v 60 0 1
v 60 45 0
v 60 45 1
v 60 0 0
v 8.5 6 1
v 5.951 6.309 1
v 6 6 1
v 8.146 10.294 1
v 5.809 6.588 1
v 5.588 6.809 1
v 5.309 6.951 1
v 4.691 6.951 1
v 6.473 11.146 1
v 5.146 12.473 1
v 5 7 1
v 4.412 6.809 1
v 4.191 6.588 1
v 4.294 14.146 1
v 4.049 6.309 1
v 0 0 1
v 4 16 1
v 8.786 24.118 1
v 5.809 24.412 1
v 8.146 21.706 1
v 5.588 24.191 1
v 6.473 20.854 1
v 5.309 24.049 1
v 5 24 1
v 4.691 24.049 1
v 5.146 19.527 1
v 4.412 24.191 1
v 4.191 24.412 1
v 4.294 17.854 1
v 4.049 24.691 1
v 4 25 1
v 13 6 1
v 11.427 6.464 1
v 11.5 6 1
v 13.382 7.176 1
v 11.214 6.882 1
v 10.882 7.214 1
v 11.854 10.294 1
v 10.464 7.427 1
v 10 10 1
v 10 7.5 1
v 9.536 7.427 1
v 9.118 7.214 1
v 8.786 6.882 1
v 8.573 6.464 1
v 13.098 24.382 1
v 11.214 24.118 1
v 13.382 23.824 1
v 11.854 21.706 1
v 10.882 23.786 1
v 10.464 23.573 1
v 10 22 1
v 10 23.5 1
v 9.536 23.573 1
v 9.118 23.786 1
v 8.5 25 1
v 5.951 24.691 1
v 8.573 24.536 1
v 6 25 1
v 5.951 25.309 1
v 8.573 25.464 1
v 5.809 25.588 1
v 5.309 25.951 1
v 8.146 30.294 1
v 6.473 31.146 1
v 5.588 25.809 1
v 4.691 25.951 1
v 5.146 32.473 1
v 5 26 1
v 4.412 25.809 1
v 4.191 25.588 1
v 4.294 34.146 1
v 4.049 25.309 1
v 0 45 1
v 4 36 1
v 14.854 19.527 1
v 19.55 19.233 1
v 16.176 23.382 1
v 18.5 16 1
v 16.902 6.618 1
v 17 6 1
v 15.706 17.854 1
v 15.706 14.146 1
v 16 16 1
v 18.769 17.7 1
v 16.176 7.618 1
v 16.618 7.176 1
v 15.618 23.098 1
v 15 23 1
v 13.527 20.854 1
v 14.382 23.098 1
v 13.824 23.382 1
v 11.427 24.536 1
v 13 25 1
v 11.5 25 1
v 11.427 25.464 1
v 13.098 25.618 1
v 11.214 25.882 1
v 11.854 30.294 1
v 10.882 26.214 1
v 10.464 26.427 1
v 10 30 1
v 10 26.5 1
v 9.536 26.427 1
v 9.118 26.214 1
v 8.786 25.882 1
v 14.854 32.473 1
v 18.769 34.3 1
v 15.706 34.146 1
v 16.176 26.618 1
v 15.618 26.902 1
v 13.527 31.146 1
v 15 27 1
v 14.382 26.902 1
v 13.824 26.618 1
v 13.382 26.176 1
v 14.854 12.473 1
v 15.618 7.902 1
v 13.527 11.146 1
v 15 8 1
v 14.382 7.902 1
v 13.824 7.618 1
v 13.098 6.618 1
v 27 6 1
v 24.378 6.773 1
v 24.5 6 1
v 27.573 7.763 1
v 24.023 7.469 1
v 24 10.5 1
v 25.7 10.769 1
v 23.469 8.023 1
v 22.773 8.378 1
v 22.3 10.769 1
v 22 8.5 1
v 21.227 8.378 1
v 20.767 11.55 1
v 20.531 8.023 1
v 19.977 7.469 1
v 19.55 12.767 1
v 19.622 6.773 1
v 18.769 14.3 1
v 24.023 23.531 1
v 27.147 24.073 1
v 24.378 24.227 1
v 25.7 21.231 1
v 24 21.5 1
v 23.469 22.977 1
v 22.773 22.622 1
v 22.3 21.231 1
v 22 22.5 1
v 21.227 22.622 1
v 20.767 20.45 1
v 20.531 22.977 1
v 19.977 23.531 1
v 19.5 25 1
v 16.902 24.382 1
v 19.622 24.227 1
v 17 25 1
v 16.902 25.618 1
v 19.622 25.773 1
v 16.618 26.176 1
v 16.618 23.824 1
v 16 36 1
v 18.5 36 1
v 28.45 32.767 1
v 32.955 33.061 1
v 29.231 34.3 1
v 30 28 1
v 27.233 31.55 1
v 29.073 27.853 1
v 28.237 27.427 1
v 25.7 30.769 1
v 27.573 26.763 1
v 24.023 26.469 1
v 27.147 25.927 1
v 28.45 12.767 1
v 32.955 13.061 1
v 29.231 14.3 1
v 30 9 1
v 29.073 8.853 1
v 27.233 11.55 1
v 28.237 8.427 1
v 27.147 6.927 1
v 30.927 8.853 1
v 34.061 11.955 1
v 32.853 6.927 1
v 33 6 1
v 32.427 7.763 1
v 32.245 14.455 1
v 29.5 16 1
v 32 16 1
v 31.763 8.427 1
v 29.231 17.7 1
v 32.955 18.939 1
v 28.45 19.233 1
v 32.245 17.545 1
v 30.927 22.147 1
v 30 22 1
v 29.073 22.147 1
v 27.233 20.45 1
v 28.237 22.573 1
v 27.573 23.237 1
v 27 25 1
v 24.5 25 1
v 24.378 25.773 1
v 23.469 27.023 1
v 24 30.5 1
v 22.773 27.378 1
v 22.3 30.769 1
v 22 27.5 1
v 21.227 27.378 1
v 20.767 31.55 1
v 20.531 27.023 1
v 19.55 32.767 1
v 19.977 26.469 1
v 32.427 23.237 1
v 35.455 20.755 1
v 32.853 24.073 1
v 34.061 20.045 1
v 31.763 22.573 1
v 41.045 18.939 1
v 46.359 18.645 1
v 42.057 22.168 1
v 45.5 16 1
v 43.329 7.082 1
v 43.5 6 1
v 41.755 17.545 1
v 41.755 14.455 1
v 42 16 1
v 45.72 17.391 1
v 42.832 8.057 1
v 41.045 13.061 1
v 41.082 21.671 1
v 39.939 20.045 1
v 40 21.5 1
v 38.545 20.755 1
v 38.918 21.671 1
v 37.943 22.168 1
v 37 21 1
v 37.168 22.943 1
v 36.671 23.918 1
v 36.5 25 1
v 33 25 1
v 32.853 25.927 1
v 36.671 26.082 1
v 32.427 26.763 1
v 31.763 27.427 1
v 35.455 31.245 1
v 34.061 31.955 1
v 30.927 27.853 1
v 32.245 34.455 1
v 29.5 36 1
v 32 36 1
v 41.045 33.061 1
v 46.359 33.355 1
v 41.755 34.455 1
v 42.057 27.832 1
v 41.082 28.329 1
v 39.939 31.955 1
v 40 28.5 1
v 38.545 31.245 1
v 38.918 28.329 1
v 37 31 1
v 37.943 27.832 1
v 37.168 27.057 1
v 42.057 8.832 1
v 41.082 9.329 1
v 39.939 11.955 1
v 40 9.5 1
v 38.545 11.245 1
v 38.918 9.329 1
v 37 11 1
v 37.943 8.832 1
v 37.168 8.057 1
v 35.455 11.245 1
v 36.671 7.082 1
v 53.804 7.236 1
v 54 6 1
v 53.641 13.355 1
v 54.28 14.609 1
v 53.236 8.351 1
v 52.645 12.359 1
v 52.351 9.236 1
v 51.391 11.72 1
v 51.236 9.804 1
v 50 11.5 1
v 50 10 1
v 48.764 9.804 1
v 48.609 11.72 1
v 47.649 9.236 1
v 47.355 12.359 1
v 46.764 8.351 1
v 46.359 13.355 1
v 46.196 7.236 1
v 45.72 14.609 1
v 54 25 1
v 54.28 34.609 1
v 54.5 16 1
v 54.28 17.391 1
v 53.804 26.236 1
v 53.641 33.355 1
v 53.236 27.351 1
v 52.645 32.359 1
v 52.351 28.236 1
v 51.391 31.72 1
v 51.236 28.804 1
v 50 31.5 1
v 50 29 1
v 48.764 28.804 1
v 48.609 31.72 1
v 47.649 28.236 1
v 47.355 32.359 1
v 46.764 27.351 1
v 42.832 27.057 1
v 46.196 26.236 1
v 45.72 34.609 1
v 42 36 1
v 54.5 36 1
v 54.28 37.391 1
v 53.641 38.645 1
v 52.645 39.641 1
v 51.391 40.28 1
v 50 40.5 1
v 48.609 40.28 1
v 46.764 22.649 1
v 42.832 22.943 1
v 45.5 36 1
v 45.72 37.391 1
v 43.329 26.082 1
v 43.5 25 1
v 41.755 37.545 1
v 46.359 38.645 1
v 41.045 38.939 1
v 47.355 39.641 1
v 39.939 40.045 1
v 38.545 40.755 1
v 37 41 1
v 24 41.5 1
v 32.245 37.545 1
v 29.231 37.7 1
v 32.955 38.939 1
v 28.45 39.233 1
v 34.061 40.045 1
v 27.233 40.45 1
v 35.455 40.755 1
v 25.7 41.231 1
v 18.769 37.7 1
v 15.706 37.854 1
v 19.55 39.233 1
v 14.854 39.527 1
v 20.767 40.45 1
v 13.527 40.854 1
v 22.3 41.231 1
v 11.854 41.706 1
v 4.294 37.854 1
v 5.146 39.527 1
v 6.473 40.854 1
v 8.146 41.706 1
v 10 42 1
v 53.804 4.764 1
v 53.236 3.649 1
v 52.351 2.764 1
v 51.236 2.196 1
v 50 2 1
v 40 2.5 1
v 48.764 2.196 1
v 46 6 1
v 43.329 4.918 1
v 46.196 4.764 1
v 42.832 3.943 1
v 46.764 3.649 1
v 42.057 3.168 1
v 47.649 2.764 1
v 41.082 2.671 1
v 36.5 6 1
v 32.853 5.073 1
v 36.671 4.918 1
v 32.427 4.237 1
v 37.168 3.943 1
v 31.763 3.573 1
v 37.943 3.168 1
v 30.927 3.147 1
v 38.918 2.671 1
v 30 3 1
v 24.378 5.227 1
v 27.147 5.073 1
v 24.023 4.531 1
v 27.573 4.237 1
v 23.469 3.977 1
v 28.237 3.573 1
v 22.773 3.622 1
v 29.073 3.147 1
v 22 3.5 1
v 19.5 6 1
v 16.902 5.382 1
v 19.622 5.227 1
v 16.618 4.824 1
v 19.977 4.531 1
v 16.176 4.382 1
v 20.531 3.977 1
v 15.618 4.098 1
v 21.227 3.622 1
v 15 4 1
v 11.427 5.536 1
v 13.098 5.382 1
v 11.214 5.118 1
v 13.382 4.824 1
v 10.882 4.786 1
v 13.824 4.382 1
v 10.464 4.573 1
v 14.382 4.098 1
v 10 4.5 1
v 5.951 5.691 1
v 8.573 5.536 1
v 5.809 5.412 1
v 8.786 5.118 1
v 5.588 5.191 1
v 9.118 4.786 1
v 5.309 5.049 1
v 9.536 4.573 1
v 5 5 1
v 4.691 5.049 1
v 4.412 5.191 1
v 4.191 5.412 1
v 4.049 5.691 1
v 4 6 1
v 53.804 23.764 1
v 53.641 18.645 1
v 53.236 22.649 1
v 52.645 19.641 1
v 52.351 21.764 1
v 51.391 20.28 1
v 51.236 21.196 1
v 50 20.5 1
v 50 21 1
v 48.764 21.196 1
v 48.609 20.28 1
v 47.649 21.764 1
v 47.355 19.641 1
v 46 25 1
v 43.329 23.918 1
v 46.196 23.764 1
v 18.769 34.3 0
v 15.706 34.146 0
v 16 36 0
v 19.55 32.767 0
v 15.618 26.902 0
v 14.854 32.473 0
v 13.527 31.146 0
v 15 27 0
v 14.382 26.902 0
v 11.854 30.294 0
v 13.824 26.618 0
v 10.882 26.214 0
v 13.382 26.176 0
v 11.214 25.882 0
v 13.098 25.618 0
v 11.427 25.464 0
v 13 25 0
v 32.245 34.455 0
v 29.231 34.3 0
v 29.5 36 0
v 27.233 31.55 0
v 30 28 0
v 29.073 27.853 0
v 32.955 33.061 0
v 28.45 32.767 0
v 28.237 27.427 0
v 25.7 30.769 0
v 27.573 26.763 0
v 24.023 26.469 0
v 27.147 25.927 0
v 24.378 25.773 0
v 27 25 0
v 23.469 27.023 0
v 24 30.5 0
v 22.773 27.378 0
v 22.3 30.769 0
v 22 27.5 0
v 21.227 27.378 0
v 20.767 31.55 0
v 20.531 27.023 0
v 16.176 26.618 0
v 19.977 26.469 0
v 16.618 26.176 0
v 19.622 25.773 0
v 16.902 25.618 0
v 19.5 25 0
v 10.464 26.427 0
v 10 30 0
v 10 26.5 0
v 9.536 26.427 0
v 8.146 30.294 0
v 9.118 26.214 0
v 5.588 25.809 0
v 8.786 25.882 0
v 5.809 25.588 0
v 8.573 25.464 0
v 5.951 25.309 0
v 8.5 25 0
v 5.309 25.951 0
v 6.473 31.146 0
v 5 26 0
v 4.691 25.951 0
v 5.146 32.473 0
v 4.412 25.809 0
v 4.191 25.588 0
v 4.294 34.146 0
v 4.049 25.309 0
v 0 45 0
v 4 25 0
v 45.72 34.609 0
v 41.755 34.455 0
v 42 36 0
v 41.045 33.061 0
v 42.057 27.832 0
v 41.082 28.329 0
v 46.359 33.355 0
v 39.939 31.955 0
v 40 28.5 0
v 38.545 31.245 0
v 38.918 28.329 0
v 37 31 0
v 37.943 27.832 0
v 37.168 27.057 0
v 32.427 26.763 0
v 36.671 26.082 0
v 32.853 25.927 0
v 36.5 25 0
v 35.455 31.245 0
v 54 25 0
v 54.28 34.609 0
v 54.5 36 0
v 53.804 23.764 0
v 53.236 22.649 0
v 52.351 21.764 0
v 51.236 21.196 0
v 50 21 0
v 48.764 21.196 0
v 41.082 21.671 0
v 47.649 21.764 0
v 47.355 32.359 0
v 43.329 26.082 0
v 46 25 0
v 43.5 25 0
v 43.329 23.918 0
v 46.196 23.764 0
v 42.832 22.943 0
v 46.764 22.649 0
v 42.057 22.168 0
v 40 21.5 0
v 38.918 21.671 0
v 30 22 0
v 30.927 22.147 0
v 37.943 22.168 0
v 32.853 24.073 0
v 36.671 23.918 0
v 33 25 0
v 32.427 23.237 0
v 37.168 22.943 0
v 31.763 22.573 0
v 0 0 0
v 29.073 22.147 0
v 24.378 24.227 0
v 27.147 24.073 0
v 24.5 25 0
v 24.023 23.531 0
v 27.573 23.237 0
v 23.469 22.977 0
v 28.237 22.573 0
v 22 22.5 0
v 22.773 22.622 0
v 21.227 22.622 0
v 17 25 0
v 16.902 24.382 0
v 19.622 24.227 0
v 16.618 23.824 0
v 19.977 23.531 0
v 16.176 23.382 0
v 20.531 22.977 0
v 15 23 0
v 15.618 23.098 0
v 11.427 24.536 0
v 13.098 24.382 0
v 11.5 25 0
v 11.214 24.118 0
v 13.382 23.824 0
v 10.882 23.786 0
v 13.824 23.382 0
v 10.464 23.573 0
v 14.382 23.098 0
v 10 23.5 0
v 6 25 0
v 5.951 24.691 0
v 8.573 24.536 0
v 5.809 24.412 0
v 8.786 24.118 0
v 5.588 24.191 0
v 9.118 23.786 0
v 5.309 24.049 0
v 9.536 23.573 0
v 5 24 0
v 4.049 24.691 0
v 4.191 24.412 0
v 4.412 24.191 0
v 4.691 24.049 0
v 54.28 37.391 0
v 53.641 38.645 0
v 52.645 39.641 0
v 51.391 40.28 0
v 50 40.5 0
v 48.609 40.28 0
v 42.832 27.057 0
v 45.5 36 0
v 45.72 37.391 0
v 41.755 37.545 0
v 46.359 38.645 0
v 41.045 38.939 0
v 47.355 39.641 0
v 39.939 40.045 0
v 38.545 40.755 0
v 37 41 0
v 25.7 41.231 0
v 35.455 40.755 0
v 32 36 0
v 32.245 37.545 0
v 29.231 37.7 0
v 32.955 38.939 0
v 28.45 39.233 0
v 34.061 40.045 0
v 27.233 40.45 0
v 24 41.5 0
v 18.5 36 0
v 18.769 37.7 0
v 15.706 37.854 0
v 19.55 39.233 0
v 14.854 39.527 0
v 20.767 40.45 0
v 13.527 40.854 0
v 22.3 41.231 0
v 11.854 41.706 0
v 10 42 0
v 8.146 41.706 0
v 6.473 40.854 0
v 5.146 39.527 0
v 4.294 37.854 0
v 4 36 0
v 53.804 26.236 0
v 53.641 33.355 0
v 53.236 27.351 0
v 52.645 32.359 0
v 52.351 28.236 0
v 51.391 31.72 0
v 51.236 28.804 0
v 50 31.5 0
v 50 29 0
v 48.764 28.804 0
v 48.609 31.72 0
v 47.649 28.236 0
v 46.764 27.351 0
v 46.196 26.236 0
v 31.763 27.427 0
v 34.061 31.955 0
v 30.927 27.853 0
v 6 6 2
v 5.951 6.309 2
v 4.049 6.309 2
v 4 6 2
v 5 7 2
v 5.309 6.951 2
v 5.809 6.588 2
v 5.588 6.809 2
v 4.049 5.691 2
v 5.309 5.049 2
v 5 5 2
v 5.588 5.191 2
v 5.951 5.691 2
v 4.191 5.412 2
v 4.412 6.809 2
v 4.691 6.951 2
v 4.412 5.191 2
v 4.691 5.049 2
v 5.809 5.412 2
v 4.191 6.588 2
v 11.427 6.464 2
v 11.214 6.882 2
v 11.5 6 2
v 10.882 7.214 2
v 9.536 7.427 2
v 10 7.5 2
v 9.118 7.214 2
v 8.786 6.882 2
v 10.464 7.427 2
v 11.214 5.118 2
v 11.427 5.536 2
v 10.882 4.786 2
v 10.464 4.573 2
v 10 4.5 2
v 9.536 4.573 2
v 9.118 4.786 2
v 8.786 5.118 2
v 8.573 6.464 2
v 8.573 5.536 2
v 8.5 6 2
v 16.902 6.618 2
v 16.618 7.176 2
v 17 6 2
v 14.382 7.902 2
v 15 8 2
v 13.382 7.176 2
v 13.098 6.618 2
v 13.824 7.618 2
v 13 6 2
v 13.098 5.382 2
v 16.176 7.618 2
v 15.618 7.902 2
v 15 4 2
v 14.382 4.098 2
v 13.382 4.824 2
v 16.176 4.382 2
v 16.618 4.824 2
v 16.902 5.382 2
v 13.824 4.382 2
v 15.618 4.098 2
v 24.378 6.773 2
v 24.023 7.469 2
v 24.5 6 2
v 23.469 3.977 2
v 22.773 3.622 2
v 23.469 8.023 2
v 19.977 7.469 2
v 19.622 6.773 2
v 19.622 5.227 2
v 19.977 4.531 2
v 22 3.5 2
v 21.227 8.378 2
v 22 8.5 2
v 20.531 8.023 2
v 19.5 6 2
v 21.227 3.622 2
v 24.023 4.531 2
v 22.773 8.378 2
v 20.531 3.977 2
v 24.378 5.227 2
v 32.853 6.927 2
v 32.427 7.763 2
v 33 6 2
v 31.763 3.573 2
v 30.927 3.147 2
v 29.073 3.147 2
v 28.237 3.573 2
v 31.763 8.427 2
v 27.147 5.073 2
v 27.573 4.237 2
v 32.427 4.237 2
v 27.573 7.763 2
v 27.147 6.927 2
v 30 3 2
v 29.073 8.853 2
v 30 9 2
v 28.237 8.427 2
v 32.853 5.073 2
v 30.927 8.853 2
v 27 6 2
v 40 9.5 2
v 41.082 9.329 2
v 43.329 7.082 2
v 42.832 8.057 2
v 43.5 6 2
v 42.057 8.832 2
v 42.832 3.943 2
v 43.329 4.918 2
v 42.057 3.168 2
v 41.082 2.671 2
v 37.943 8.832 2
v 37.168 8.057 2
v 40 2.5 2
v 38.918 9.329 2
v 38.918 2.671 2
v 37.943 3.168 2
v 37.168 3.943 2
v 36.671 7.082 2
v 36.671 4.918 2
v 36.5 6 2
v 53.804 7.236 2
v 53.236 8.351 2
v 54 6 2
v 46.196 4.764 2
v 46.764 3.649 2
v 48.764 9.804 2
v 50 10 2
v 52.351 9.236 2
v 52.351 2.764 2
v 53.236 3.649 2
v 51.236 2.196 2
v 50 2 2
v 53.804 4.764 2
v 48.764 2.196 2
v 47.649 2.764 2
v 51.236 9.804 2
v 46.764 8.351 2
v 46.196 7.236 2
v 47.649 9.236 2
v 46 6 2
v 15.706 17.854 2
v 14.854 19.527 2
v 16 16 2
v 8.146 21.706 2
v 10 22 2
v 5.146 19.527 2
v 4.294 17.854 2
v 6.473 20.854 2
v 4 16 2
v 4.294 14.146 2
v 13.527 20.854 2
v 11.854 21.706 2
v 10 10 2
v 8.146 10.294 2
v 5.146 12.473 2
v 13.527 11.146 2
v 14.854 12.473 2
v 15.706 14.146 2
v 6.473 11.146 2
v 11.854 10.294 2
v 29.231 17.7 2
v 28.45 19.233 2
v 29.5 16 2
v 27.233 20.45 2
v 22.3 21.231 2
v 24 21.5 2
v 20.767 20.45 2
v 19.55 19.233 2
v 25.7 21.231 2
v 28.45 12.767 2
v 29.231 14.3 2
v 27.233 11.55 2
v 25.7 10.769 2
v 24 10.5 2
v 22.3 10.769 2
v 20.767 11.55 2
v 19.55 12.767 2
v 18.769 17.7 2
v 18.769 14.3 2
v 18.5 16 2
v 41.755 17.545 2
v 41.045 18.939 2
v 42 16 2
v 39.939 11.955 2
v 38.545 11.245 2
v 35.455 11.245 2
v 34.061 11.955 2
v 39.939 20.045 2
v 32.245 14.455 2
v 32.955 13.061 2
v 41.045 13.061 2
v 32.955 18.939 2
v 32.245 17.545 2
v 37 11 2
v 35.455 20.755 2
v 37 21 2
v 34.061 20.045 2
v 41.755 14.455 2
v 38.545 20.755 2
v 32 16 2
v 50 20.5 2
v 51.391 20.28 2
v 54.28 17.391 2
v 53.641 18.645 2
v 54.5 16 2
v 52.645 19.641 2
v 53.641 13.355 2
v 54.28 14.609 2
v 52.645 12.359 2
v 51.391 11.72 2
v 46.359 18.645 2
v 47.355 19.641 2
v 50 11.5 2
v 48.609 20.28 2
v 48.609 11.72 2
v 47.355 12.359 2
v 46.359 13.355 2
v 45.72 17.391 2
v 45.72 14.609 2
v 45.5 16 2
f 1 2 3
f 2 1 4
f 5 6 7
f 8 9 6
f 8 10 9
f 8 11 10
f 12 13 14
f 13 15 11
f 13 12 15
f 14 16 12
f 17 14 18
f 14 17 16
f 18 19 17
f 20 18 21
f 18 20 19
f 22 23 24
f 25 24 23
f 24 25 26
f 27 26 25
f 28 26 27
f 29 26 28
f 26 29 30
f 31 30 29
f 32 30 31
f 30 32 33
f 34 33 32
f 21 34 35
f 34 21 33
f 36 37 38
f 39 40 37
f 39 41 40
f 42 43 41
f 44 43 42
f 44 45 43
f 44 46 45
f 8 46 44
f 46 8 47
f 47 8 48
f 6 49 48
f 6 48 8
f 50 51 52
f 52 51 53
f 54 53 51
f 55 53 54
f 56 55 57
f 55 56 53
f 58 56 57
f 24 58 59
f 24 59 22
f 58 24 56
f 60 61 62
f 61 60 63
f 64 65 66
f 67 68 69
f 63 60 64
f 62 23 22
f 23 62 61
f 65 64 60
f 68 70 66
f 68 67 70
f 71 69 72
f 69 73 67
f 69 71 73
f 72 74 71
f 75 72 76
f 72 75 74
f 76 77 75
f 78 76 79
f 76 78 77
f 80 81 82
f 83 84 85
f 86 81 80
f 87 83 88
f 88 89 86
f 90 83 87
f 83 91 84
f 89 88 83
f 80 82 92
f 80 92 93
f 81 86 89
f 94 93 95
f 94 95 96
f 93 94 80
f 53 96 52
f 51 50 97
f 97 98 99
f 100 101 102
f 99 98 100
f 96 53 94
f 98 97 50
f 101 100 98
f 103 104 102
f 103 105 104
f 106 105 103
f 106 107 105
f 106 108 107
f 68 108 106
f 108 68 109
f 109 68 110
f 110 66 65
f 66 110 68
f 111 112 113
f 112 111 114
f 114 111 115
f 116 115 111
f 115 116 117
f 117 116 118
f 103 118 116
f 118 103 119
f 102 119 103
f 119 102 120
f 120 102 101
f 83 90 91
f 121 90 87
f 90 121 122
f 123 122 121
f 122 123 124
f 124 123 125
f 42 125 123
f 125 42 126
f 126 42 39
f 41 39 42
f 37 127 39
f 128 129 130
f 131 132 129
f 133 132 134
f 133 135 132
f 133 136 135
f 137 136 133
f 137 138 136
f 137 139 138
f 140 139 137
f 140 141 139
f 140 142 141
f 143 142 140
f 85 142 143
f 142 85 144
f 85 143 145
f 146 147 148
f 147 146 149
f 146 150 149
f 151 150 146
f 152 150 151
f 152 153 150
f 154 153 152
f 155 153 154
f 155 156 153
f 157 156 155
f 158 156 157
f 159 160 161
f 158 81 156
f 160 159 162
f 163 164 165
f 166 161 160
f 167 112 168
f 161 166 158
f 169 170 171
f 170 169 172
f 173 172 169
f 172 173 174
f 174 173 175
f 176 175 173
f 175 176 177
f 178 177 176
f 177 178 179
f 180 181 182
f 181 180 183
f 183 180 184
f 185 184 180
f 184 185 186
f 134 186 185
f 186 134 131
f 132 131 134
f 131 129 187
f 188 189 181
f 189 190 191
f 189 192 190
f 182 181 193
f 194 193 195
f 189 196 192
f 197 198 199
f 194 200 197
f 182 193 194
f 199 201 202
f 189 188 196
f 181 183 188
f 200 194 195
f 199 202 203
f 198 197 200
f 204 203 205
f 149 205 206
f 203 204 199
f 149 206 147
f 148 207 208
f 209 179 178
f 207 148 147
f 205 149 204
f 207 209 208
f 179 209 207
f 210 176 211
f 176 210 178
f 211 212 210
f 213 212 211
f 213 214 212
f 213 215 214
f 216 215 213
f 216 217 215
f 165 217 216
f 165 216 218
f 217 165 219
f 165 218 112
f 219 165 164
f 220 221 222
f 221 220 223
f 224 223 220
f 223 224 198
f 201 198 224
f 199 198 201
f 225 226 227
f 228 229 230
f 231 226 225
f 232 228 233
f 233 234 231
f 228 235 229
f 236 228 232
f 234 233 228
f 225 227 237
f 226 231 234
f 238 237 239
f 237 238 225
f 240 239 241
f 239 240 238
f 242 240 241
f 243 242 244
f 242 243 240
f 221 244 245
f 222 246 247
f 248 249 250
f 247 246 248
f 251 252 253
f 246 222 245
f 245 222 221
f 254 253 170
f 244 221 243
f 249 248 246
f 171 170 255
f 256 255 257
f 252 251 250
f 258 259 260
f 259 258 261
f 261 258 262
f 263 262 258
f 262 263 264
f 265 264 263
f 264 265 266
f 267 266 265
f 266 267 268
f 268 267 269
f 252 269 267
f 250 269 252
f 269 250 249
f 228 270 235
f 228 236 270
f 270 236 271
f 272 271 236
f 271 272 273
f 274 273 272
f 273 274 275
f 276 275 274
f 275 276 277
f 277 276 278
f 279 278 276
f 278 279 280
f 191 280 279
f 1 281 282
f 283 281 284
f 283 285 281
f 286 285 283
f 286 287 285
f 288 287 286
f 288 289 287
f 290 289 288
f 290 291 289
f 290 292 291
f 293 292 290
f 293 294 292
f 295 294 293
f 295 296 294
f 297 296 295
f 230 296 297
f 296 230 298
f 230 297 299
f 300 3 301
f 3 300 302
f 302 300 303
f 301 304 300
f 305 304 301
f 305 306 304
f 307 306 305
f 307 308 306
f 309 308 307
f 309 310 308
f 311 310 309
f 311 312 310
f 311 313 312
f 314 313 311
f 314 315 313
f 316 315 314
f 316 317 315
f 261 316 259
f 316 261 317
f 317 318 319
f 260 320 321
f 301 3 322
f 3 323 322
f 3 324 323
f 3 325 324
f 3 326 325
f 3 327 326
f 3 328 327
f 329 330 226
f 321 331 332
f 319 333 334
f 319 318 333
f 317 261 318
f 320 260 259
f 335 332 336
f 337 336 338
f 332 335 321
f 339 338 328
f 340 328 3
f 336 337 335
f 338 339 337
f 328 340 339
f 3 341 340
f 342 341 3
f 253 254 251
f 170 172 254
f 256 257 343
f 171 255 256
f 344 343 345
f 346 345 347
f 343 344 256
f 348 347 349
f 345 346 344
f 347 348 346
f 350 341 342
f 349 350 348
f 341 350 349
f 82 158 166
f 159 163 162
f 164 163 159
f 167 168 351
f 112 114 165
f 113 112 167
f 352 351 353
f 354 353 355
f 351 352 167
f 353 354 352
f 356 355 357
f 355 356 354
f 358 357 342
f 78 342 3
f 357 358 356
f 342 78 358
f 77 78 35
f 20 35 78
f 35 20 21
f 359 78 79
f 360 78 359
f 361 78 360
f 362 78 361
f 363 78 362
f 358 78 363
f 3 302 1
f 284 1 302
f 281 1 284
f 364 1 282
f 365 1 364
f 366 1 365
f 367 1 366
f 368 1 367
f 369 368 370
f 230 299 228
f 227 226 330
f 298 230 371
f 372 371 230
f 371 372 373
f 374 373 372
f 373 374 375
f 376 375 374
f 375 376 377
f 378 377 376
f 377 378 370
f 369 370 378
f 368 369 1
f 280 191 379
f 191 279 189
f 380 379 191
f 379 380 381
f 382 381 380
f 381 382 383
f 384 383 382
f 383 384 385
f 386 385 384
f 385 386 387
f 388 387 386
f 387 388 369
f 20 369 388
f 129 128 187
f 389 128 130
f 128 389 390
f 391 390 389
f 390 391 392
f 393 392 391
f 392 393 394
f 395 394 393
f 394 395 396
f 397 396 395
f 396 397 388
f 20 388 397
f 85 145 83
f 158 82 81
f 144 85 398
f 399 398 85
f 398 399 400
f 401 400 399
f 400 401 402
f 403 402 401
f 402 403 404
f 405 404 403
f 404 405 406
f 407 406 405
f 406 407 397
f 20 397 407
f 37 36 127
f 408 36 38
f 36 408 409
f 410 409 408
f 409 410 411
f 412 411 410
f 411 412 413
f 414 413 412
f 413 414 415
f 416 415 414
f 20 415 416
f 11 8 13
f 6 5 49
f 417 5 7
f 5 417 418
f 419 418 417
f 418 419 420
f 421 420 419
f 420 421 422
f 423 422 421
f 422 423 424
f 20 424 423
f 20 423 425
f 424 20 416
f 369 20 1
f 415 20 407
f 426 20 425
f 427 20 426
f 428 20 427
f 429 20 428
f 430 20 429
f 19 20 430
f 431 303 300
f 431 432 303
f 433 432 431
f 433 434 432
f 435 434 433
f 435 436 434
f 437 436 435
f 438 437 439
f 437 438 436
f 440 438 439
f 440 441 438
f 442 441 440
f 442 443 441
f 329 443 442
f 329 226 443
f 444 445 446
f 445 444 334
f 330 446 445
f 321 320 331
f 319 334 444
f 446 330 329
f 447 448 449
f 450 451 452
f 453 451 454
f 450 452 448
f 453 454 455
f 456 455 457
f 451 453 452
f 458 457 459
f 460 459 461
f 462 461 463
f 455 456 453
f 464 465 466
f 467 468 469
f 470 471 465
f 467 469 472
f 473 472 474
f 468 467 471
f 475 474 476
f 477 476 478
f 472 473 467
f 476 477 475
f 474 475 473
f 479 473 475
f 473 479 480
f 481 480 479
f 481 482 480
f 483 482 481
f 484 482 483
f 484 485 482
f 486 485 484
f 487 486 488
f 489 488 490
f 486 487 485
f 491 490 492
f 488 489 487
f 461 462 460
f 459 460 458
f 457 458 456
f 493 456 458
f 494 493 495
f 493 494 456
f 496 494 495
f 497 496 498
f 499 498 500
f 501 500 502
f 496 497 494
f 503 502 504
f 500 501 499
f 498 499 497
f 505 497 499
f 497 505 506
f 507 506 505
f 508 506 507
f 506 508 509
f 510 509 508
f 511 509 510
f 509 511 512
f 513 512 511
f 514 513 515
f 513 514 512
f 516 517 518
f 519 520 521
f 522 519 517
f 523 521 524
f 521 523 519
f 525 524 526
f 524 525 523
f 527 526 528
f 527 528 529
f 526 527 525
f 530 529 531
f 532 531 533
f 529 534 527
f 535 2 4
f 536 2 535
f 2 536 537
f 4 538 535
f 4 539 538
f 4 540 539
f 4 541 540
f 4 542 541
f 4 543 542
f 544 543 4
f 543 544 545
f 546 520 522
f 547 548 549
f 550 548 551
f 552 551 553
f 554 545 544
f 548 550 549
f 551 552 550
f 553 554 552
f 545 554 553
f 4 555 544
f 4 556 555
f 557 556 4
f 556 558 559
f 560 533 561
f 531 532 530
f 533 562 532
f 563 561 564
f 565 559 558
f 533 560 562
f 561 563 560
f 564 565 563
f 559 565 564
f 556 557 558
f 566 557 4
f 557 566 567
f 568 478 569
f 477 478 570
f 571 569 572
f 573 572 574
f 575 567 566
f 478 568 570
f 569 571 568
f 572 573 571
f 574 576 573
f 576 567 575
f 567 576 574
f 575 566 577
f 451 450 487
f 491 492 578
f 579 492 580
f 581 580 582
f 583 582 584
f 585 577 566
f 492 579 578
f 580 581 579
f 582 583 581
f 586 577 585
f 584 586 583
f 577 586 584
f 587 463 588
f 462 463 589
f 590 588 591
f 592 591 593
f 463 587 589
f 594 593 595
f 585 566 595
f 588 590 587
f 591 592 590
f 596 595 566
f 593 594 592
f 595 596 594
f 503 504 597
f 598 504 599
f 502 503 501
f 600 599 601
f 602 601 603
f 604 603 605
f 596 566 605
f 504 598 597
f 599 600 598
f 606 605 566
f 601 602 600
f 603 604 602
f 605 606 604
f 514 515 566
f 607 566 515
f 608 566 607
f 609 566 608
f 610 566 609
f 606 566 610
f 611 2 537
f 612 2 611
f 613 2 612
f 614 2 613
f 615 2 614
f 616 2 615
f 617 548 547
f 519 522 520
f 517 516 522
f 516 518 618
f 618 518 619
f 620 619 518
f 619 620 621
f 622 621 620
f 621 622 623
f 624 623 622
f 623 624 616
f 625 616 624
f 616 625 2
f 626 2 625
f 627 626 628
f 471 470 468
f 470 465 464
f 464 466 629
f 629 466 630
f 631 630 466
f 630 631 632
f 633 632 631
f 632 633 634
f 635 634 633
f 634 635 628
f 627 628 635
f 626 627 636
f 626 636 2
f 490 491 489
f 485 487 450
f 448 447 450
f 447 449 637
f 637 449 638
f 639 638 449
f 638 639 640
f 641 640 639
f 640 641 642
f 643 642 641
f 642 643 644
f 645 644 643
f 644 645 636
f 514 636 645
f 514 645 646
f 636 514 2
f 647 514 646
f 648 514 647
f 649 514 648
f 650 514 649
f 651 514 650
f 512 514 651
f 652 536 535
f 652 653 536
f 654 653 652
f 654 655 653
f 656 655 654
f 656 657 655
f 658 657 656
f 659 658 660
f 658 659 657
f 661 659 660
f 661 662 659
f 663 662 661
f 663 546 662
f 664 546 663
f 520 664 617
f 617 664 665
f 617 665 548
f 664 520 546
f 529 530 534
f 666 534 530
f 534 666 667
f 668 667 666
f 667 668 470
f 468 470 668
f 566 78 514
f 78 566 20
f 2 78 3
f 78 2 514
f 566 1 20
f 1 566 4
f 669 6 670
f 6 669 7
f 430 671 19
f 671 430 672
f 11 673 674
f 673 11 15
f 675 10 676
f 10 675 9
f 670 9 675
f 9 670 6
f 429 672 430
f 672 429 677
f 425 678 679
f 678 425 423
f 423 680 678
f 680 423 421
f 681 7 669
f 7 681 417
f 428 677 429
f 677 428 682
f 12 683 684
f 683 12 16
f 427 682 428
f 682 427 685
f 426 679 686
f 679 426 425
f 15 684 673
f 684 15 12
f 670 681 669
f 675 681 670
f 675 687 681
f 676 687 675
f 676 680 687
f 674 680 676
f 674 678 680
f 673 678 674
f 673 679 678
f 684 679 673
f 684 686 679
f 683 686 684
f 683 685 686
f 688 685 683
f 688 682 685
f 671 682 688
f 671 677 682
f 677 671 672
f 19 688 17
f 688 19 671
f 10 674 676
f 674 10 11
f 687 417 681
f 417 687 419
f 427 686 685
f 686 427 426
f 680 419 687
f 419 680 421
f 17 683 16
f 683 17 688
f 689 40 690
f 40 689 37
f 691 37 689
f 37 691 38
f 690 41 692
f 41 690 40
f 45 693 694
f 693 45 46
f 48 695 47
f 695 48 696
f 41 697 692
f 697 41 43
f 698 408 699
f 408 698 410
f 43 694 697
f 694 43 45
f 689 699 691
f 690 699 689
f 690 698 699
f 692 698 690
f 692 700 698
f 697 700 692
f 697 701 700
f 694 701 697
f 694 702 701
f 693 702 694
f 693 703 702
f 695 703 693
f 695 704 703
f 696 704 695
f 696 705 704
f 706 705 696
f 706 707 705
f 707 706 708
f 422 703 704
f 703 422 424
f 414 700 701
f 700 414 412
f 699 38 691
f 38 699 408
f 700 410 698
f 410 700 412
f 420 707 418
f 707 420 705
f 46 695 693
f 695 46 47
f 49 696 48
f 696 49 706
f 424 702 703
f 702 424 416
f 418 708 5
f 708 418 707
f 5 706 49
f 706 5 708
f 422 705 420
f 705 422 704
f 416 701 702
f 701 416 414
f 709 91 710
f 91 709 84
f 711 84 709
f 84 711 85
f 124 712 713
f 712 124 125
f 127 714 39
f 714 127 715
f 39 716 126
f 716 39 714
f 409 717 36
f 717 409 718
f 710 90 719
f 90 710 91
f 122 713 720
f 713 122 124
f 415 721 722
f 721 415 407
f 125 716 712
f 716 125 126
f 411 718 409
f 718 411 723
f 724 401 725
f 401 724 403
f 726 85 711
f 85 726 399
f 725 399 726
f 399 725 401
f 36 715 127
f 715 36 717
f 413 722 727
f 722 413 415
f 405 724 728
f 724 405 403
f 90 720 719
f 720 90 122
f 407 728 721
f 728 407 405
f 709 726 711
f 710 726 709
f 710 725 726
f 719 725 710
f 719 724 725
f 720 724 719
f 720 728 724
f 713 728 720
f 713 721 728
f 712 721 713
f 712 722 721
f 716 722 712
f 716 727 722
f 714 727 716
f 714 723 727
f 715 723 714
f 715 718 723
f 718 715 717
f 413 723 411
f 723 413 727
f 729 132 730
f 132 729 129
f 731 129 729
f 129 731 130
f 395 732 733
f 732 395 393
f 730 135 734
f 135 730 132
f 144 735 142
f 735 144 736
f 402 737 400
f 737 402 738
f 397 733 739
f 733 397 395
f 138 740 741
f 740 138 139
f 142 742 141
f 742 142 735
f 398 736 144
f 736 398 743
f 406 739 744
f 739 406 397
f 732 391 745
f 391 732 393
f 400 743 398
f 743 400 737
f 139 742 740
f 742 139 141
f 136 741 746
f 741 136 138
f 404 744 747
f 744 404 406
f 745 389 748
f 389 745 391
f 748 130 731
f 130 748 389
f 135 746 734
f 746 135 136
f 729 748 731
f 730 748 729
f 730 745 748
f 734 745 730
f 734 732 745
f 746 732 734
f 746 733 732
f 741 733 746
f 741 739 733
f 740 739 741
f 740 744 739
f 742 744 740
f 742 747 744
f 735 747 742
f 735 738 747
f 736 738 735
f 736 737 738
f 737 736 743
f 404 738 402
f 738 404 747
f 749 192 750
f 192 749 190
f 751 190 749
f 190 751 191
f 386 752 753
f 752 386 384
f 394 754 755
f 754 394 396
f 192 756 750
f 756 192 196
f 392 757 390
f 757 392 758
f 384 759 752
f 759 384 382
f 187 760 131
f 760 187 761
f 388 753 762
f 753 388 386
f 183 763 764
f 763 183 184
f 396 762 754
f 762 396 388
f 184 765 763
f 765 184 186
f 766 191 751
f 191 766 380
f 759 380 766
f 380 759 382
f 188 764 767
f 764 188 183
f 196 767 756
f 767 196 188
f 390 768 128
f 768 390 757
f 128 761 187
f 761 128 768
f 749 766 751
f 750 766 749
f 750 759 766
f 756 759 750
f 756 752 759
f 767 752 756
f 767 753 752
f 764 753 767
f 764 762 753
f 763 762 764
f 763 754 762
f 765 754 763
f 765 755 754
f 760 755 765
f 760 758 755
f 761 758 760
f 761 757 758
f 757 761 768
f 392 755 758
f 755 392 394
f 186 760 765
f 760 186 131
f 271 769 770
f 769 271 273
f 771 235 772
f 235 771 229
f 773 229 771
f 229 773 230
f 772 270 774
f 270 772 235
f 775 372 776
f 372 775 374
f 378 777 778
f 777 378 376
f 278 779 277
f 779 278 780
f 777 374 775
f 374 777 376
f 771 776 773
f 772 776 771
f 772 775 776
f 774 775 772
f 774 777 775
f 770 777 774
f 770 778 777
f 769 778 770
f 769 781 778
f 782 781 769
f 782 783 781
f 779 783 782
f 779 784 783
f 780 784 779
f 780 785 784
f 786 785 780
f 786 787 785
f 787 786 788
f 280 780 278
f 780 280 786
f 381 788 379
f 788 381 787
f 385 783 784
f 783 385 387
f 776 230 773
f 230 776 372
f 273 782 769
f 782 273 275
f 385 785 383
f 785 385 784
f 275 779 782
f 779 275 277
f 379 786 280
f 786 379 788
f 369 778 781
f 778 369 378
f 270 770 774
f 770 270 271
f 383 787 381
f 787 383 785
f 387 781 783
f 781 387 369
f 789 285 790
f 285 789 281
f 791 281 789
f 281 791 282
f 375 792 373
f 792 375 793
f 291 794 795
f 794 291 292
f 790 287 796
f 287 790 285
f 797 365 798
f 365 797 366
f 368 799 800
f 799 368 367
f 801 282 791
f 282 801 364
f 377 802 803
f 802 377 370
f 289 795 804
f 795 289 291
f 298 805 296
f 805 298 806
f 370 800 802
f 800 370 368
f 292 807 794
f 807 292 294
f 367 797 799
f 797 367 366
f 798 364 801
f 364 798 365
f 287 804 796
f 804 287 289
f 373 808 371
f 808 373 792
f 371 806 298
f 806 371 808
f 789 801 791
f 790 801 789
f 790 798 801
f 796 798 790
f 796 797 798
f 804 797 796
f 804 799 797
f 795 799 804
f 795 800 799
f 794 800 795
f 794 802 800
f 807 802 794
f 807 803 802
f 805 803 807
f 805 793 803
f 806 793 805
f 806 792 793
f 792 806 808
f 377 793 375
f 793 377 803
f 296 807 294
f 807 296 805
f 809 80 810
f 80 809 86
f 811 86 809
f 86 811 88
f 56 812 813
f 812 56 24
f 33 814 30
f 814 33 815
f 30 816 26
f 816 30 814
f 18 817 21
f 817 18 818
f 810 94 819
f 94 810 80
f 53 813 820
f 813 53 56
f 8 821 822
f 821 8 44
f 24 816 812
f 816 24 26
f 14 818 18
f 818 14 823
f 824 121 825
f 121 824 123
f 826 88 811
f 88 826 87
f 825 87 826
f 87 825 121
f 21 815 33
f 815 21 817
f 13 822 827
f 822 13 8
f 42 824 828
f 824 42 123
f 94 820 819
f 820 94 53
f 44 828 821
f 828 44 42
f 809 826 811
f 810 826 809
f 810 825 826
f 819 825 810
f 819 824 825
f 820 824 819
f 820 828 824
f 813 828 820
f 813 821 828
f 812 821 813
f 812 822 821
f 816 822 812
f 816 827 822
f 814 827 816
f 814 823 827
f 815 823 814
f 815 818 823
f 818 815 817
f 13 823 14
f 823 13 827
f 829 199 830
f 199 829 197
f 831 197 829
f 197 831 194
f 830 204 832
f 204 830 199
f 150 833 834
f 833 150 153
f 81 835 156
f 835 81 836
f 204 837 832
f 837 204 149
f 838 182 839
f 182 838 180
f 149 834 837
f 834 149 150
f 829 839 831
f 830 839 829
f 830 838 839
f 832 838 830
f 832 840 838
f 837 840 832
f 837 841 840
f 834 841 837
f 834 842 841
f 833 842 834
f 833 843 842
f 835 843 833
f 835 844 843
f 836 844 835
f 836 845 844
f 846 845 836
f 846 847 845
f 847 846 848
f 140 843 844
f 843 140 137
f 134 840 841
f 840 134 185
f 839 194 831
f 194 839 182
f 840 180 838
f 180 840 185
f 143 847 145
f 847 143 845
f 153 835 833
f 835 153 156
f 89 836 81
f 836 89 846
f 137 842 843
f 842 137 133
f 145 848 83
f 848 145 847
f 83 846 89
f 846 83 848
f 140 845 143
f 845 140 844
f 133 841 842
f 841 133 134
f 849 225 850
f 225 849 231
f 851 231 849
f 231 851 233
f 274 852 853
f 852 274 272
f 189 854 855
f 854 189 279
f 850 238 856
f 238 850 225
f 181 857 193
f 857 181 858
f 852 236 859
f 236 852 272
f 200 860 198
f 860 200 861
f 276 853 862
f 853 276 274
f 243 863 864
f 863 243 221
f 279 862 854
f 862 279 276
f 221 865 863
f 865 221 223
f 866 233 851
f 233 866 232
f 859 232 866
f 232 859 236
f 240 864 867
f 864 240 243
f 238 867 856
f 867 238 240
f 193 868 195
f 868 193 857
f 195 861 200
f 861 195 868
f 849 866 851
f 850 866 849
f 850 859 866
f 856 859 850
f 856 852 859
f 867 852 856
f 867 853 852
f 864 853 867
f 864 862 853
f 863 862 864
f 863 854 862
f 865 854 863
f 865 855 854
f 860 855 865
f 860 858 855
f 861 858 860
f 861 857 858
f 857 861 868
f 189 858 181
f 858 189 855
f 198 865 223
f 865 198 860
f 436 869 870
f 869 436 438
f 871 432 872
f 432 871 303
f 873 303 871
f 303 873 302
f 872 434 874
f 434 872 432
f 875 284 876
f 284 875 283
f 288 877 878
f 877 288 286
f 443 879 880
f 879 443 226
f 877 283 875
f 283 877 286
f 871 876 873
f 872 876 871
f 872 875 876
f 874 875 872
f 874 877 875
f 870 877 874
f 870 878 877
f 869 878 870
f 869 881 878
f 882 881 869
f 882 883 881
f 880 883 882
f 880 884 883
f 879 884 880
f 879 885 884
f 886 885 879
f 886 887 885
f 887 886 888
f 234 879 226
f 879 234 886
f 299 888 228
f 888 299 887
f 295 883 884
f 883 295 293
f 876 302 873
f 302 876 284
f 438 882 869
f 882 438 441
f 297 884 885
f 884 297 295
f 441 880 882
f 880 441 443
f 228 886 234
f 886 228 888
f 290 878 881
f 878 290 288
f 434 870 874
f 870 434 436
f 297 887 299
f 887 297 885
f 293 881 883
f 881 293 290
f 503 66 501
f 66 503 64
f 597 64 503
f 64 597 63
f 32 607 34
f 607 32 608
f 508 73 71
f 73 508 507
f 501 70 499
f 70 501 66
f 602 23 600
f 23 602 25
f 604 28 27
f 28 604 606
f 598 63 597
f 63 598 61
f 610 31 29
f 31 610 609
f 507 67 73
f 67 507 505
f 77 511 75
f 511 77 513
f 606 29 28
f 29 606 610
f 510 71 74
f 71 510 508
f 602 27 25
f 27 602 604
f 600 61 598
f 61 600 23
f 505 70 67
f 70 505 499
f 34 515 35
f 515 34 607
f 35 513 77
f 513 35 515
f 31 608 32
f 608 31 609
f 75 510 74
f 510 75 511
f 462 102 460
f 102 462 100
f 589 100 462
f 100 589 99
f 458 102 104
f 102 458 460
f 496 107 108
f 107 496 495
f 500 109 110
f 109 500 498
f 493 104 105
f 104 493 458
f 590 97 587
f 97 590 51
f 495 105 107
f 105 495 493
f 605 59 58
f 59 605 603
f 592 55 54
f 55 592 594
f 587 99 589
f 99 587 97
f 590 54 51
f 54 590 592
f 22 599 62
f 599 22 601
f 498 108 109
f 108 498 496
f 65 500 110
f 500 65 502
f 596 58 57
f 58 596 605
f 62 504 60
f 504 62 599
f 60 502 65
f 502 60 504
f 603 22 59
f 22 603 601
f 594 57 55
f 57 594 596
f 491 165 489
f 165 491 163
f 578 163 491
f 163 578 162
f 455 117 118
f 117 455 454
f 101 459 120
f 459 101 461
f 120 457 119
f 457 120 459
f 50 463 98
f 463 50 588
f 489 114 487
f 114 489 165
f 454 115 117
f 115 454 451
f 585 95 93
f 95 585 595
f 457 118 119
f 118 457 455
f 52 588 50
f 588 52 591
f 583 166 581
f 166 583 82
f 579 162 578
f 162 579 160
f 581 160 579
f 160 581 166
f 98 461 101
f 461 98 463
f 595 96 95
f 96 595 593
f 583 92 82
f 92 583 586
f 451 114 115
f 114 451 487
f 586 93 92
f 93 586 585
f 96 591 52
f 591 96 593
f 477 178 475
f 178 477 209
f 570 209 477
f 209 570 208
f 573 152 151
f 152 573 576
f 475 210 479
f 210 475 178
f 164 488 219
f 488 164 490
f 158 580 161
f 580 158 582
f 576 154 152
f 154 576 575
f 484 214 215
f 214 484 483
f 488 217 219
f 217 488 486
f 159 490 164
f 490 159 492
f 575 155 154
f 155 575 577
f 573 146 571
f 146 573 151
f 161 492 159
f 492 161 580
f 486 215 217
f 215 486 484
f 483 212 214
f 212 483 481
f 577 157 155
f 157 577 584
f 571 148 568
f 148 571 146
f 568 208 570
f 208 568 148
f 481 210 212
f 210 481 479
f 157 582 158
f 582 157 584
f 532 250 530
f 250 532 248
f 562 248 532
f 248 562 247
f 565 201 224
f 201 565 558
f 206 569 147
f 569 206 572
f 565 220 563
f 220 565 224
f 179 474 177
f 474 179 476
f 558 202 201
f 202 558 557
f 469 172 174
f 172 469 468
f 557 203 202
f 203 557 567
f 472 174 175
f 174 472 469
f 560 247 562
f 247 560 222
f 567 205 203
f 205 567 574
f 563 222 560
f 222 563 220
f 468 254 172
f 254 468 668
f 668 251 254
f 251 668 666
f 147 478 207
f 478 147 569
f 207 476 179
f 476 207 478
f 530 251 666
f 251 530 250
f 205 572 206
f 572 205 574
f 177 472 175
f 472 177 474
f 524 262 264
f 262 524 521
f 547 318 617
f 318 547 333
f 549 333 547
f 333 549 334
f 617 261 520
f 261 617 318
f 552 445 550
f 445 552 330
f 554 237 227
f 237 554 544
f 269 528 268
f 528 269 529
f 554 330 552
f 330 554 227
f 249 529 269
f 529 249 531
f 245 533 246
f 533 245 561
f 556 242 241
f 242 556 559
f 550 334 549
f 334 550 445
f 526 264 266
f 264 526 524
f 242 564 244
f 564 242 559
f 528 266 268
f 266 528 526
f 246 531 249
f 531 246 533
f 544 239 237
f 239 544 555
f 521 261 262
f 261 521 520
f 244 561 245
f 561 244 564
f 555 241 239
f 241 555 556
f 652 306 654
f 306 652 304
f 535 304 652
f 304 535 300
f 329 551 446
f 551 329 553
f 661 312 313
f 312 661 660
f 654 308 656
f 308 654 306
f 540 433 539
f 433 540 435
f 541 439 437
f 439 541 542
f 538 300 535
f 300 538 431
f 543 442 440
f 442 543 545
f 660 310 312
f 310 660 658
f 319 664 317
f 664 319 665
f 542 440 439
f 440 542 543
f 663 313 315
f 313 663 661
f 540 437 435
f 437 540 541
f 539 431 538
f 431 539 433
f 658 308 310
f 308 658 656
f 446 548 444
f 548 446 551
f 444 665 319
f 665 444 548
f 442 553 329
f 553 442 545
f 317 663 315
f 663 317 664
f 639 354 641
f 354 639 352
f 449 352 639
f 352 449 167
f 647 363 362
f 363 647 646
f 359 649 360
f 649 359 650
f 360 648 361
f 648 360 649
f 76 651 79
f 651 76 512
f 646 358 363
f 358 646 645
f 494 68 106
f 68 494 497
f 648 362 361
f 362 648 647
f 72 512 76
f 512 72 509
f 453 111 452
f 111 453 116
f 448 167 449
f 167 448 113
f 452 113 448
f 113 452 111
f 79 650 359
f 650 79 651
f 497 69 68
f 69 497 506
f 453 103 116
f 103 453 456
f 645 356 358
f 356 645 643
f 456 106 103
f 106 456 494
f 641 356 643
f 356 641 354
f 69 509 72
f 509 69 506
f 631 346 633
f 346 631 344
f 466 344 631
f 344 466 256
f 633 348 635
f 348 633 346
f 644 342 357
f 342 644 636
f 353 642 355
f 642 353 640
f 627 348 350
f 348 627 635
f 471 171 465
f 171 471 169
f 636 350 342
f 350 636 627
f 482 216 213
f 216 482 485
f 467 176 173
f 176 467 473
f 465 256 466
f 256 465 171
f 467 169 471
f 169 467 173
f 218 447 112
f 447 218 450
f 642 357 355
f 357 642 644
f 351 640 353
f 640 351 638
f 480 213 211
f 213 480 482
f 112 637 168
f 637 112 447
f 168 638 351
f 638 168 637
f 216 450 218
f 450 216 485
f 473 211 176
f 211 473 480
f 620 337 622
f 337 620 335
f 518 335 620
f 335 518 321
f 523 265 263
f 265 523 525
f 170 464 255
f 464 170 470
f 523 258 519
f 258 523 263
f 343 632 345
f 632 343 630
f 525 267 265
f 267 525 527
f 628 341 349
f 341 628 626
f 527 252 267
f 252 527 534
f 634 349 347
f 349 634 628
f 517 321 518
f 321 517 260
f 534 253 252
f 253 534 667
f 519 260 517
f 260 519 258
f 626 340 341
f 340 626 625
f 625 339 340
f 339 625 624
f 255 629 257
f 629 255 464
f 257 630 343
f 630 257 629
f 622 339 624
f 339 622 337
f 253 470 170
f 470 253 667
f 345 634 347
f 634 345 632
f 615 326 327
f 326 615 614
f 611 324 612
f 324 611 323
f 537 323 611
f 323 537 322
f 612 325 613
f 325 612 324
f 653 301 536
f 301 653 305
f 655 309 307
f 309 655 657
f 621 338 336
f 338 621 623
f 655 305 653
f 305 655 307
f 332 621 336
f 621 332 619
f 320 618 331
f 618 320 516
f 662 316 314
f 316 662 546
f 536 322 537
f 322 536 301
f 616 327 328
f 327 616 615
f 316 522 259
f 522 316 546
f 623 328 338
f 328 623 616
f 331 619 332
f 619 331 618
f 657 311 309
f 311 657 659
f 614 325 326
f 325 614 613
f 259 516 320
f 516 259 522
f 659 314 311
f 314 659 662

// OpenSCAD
// holes and pins for calibration

$fn = 20;
l1 = 6;
l2 = 16;
l3 = 25;
l4 = 36;

difference() {
  union() {
    cube( [60, 45, 1] );
    translate([  5, l1, 0]) cylinder( r=1.0, h=2 );
    translate([ 10, l1, 0]) cylinder( r=1.5, h=2 );
    translate([ 15, l1, 0]) cylinder( r=2.0, h=2 );
    translate([ 22, l1, 0]) cylinder( r=2.5, h=2 );
    translate([ 30, l1, 0]) cylinder( r=3.0, h=2 );
    translate([ 40, l1, 0]) cylinder( r=3.5, h=2 );
    translate([ 50, l1, 0]) cylinder( r=4.0, h=2 );
    
    // translate([  5, l2, 0]) cylinder( r=7.5, h=2 );
    // translate([ 10, l2, 0]) cylinder( r=7.0, h=2 );
    // translate([ 15, l2, 0]) cylinder( r=6.5, h=2 );
    translate([ 10, l2, 0]) cylinder( r=6.0, h=2 );
    translate([ 24, l2, 0]) cylinder( r=5.5, h=2 );
    translate([ 37, l2, 0]) cylinder( r=5.0, h=2 );
    translate([ 50, l2, 0]) cylinder( r=4.5, h=2 );
  }
  translate([  5, l3, 0]) cylinder( r=1.0, h=2 );
  translate([ 10, l3, 0]) cylinder( r=1.5, h=2 );
  translate([ 15, l3, 0]) cylinder( r=2.0, h=2 );
  translate([ 22, l3, 0]) cylinder( r=2.5, h=2 );
  translate([ 30, l3, 0]) cylinder( r=3.0, h=2 );
  translate([ 40, l3, 0]) cylinder( r=3.5, h=2 );
  translate([ 50, l3, 0]) cylinder( r=4.0, h=2 );
  
  translate([ 10, l4, 0]) cylinder( r=6.0, h=2 );
  translate([ 24, l4, 0]) cylinder( r=5.5, h=2 );
  translate([ 37, l4, 0]) cylinder( r=5.0, h=2 );
  translate([ 50, l4, 0]) cylinder( r=4.5, h=2 );
  
}
